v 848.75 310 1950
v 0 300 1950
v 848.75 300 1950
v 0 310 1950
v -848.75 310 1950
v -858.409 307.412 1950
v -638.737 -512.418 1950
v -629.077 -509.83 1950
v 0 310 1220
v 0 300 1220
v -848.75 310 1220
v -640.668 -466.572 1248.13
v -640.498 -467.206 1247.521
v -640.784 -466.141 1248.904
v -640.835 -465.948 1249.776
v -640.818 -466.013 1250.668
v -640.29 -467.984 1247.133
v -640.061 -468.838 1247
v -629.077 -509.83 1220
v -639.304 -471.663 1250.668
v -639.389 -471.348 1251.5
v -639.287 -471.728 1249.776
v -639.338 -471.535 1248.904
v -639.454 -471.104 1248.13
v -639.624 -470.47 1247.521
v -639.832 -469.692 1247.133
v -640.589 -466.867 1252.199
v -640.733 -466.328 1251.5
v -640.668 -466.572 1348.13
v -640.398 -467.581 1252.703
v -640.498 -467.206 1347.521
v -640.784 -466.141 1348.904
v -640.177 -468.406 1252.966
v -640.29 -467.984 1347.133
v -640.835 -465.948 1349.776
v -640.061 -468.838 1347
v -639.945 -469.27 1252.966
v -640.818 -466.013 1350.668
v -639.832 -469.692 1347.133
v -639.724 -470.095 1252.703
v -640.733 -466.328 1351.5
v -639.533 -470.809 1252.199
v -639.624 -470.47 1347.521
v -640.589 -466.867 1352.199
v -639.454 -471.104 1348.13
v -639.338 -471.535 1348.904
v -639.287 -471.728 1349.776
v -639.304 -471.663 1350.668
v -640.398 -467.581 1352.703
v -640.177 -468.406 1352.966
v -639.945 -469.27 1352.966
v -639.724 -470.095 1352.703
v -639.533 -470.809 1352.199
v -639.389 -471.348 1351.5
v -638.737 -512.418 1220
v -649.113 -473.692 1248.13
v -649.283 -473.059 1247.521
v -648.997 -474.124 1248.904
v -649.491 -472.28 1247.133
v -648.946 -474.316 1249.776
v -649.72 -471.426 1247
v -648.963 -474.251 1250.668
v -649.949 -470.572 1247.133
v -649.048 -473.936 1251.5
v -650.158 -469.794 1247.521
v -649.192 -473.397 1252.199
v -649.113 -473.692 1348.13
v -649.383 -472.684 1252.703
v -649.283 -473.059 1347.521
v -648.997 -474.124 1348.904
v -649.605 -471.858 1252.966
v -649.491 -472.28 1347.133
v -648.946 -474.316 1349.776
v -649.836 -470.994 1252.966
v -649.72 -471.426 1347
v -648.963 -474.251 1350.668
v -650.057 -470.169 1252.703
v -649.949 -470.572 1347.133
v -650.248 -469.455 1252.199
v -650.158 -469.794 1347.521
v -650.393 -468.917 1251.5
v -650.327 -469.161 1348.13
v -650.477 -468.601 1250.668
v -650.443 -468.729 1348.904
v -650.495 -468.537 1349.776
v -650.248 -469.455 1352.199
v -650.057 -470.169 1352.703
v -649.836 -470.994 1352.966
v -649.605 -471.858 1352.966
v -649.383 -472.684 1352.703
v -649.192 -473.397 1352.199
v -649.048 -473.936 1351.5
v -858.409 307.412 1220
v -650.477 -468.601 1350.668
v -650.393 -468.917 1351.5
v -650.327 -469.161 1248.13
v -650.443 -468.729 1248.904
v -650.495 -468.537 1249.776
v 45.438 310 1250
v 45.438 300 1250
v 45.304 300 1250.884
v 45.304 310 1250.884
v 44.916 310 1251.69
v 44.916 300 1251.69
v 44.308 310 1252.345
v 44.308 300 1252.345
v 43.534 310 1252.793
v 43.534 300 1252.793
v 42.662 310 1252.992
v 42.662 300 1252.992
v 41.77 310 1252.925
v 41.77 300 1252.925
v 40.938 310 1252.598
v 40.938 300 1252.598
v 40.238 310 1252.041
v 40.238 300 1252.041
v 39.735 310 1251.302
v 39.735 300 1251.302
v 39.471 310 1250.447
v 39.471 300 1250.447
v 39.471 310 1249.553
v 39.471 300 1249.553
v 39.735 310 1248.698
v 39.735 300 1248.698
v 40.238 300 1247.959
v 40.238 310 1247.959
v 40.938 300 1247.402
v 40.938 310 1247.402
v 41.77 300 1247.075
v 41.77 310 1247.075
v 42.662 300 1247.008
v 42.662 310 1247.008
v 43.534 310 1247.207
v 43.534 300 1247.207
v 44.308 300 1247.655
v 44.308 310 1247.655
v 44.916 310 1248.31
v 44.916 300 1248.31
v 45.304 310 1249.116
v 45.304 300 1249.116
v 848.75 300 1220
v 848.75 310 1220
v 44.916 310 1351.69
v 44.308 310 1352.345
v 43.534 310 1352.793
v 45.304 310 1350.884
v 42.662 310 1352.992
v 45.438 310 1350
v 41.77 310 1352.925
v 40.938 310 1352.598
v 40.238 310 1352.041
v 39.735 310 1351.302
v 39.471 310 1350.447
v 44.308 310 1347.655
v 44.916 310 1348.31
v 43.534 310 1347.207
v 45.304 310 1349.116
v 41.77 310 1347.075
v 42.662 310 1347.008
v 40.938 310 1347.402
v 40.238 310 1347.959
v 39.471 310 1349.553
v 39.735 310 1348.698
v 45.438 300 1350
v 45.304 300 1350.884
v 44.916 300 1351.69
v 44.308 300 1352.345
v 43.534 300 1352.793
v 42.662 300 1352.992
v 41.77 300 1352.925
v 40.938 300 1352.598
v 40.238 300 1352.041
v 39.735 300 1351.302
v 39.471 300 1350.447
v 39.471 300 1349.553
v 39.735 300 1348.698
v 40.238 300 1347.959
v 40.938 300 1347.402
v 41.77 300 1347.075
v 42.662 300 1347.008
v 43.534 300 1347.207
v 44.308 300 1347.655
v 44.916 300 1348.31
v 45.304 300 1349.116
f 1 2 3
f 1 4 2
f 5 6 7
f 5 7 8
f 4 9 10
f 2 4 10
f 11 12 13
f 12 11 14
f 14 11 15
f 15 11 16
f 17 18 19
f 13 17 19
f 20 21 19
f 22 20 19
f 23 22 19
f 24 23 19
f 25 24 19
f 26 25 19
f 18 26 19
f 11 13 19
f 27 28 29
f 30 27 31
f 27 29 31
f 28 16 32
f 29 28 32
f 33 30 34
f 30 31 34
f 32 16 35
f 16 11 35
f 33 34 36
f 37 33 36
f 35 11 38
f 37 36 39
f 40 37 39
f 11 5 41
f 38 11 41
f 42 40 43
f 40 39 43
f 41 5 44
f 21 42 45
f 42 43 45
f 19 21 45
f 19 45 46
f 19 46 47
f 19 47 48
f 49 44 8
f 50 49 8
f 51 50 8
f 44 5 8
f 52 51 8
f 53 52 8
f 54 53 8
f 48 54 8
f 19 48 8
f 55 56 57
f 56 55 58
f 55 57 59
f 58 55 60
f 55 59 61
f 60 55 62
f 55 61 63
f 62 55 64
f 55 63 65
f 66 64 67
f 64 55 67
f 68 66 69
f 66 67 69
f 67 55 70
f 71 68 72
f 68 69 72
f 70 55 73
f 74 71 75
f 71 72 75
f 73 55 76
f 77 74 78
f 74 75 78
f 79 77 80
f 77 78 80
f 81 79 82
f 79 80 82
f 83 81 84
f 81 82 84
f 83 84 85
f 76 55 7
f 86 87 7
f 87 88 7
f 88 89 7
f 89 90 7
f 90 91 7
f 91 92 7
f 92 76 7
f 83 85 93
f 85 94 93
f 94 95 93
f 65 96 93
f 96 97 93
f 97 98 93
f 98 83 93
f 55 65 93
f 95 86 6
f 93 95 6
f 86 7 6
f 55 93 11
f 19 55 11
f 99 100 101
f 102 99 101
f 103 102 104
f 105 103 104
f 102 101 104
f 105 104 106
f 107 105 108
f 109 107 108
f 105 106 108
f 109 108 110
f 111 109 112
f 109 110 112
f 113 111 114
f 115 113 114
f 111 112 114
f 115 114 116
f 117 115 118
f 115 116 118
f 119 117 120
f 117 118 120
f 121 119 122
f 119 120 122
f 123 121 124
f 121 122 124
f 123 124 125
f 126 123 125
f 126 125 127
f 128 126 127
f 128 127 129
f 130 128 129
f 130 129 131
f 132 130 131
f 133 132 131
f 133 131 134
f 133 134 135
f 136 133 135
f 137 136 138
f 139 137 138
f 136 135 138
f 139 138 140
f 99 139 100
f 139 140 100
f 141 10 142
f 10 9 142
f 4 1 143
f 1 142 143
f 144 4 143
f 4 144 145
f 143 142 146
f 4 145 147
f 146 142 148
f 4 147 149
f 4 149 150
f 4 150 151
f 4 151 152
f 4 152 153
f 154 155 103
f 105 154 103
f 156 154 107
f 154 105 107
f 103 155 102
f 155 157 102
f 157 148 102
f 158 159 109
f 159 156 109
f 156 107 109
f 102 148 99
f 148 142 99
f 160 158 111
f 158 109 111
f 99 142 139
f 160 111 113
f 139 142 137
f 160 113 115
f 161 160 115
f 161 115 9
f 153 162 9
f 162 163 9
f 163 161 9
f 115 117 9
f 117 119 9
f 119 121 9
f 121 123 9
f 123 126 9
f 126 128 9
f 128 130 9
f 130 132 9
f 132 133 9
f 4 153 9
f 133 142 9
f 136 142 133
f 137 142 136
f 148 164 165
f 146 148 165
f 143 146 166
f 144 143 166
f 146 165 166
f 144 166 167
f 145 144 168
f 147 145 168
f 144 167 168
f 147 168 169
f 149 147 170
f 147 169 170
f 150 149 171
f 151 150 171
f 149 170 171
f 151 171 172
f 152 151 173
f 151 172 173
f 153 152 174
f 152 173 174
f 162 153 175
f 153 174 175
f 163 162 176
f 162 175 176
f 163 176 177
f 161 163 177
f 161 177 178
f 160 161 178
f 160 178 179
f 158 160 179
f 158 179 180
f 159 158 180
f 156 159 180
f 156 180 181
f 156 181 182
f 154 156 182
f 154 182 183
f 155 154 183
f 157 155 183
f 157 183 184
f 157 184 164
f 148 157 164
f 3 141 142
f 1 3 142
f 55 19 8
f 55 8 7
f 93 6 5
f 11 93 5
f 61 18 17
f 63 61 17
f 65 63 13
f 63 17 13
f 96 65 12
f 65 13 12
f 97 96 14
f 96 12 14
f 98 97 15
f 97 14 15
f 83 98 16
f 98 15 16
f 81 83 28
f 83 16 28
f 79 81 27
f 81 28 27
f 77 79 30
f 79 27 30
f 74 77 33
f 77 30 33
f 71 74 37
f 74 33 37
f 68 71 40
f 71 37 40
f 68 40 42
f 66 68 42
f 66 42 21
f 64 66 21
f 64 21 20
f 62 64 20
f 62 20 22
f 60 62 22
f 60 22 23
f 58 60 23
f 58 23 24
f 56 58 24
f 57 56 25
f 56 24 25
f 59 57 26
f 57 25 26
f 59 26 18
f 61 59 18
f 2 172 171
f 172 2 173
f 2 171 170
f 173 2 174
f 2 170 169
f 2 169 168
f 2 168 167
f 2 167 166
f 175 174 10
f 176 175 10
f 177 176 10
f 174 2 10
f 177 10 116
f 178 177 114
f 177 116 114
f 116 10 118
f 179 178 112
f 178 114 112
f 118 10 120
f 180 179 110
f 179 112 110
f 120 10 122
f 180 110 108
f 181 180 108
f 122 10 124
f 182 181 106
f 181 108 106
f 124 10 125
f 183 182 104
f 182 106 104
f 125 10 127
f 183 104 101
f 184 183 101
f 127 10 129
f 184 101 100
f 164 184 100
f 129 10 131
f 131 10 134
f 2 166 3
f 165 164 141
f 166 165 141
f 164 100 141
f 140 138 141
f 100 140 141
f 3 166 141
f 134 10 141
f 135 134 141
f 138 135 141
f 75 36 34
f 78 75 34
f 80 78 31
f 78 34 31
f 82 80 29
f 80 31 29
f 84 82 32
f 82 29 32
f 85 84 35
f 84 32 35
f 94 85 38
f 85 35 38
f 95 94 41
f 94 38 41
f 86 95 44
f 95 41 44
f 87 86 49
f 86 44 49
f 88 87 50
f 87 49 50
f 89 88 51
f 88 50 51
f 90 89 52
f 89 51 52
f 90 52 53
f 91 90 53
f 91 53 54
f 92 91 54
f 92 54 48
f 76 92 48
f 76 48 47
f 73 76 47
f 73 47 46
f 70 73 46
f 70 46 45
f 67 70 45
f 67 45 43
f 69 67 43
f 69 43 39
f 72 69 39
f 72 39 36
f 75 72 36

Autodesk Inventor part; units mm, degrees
ref_plane "YZ Plane" through (0, 0, 0) normal (1, 0, 0) x (0, 1, 0)
ref_plane "XZ Plane" through (0, 0, 0) normal (0, 1, 0) x (-1, 0, 0)
ref_plane "Plano de trabajo4" through (0, 0, 1220) normal (0, 0, 1) x (1, 0, 0)
sketch "Boceto8" plane through (0, 0, 1220) normal (0, 0, 1) x (1, 0, 0)
  line L0 (480, 0) -> (0, 0) projected
  line L1 (480, 0) -> (480, 10) projected
  line L2 (0, 10) -> (480, 10) projected
  line L3 (0, 0) -> (0, 10) projected
  line L4 (480, 10) -> (0, 10) projected
  line L5 (0, 10) -> (0, 300)
  line L6 (0, 300) -> (848.75, 300)
  line L7 (848.75, 300) -> (848.75, 310)
  line L8 (848.75, 310) -> (0, 310)
  line L9 (0, 310) -> (0, 300)
  point P0 (0, 0)
  dimension "d38" = 290
  dimension "d39" = 848.75
  dimension "d40" = 10
extrude "Extrusión8" add sketch "Boceto8" along normal blind 730 contours L9 L8 L7 L6
sketch "Boceto9" plane through (0, 300, 1220) normal (0, -1, 0) x (1, 0, 0)
  line L0 (0, 0) -> (848.75, 0) construction
  line L1 (848.75, 0) -> (848.75, 730) construction
  line L2 (0, 730) -> (848.75, 730) construction
  line L3 (0, 0) -> (0, 730) construction
  line L4 (0, 80) -> (848.75, 80) construction
  line L5 (0, 0) -> (848.75, 0) construction
  line L6 (42.4375, 0) -> (42.4375, 730) construction
  line L7 (0, 730) -> (848.75, 730) construction
  circle A0 centre (42.4375, 30) radius 3
  circle A1 centre (42.4375, 130) radius 3
  point P0 (0, -1220)
  dimension "d43" = 42.4375
  dimension "d44" = 80
  dimension "d45" = 6
  dimension "d46" = 50
extrude "Extrusión9" cut sketch "Boceto9" against normal up to next
sketch "Boceto10" plane through (0, 0, 1950) normal (0, 0, 1) x (1, 0, 0)
  line L0 (848.75, 310) -> (0, 310) projected
  line L1 (0, 310) -> (-848.75, 310)
  line L2 (-848.75, 310) -> (-629.0773, -509.8295)
  line L3 (-629.0773, -509.8295) -> (-638.7366, -512.4177)
  line L4 (-638.7366, -512.4177) -> (-858.4093, 307.4118)
  line L5 (-858.4093, 307.4118) -> (-848.75, 310)
  point P0 (0, 0)
  dimension "d49" = 848.75
  dimension "d50" = 848.75
  dimension "angulo" = 75
  dimension "d52" = 10
  dimension "d53" = 848.75
extrude "Extrusión10" add sketch "Boceto10" against normal blind 730
sketch "Boceto11" plane through (-629.0773, -509.8295, 1950) normal (0.9659, 0.2588, 0) x (0, 0, -1)
  line L0 (0, 848.75) -> (0, 0) construction
  line L1 (0, 0) -> (730, 0) construction
  line L2 (730, 848.75) -> (730, 0) construction
  line L3 (0, 848.75) -> (730, 848.75) construction
  line L4 (0, 848.75) -> (0, 0) construction
  line L5 (0, 42.4375) -> (730, 42.4375) construction
  line L6 (0, 0) -> (730, 0) construction
  line L7 (650, 0) -> (650, 848.75) construction
  line L8 (0, 848.75) -> (730, 848.75) construction
  circle A0 centre (700, 42.4375) radius 3
  circle A1 centre (600, 42.4375) radius 3
  point P0 (1950, 329.6403)
  dimension "d56" = 42.4375
  dimension "d57" = 80
  dimension "d58" = 6
  dimension "d59" = 50
extrude "Extrusión11" cut sketch "Boceto11" against normal up to next
equation "\"d39\" = ancho_m"
equation "\"d40\" = espesor"
equation "\"d43\" = 0.05 * ancho_m"
equation "\"d49\" = ancho_m"
equation "\"d50\" = ancho_m"
equation "\"d52\" = espesor"
equation "\"d53\" = ancho_m"
equation "\"d54\" = h_sup"
equation "\"d56\" = 0.05 * ancho_m"
equation "\"d60\" = h_sup"
equation "\"ancho_m\" = 848.75"
equation "\"espesor\" = 10"
equation "\"h_sup\" = 730"
properties part number "puerta"
